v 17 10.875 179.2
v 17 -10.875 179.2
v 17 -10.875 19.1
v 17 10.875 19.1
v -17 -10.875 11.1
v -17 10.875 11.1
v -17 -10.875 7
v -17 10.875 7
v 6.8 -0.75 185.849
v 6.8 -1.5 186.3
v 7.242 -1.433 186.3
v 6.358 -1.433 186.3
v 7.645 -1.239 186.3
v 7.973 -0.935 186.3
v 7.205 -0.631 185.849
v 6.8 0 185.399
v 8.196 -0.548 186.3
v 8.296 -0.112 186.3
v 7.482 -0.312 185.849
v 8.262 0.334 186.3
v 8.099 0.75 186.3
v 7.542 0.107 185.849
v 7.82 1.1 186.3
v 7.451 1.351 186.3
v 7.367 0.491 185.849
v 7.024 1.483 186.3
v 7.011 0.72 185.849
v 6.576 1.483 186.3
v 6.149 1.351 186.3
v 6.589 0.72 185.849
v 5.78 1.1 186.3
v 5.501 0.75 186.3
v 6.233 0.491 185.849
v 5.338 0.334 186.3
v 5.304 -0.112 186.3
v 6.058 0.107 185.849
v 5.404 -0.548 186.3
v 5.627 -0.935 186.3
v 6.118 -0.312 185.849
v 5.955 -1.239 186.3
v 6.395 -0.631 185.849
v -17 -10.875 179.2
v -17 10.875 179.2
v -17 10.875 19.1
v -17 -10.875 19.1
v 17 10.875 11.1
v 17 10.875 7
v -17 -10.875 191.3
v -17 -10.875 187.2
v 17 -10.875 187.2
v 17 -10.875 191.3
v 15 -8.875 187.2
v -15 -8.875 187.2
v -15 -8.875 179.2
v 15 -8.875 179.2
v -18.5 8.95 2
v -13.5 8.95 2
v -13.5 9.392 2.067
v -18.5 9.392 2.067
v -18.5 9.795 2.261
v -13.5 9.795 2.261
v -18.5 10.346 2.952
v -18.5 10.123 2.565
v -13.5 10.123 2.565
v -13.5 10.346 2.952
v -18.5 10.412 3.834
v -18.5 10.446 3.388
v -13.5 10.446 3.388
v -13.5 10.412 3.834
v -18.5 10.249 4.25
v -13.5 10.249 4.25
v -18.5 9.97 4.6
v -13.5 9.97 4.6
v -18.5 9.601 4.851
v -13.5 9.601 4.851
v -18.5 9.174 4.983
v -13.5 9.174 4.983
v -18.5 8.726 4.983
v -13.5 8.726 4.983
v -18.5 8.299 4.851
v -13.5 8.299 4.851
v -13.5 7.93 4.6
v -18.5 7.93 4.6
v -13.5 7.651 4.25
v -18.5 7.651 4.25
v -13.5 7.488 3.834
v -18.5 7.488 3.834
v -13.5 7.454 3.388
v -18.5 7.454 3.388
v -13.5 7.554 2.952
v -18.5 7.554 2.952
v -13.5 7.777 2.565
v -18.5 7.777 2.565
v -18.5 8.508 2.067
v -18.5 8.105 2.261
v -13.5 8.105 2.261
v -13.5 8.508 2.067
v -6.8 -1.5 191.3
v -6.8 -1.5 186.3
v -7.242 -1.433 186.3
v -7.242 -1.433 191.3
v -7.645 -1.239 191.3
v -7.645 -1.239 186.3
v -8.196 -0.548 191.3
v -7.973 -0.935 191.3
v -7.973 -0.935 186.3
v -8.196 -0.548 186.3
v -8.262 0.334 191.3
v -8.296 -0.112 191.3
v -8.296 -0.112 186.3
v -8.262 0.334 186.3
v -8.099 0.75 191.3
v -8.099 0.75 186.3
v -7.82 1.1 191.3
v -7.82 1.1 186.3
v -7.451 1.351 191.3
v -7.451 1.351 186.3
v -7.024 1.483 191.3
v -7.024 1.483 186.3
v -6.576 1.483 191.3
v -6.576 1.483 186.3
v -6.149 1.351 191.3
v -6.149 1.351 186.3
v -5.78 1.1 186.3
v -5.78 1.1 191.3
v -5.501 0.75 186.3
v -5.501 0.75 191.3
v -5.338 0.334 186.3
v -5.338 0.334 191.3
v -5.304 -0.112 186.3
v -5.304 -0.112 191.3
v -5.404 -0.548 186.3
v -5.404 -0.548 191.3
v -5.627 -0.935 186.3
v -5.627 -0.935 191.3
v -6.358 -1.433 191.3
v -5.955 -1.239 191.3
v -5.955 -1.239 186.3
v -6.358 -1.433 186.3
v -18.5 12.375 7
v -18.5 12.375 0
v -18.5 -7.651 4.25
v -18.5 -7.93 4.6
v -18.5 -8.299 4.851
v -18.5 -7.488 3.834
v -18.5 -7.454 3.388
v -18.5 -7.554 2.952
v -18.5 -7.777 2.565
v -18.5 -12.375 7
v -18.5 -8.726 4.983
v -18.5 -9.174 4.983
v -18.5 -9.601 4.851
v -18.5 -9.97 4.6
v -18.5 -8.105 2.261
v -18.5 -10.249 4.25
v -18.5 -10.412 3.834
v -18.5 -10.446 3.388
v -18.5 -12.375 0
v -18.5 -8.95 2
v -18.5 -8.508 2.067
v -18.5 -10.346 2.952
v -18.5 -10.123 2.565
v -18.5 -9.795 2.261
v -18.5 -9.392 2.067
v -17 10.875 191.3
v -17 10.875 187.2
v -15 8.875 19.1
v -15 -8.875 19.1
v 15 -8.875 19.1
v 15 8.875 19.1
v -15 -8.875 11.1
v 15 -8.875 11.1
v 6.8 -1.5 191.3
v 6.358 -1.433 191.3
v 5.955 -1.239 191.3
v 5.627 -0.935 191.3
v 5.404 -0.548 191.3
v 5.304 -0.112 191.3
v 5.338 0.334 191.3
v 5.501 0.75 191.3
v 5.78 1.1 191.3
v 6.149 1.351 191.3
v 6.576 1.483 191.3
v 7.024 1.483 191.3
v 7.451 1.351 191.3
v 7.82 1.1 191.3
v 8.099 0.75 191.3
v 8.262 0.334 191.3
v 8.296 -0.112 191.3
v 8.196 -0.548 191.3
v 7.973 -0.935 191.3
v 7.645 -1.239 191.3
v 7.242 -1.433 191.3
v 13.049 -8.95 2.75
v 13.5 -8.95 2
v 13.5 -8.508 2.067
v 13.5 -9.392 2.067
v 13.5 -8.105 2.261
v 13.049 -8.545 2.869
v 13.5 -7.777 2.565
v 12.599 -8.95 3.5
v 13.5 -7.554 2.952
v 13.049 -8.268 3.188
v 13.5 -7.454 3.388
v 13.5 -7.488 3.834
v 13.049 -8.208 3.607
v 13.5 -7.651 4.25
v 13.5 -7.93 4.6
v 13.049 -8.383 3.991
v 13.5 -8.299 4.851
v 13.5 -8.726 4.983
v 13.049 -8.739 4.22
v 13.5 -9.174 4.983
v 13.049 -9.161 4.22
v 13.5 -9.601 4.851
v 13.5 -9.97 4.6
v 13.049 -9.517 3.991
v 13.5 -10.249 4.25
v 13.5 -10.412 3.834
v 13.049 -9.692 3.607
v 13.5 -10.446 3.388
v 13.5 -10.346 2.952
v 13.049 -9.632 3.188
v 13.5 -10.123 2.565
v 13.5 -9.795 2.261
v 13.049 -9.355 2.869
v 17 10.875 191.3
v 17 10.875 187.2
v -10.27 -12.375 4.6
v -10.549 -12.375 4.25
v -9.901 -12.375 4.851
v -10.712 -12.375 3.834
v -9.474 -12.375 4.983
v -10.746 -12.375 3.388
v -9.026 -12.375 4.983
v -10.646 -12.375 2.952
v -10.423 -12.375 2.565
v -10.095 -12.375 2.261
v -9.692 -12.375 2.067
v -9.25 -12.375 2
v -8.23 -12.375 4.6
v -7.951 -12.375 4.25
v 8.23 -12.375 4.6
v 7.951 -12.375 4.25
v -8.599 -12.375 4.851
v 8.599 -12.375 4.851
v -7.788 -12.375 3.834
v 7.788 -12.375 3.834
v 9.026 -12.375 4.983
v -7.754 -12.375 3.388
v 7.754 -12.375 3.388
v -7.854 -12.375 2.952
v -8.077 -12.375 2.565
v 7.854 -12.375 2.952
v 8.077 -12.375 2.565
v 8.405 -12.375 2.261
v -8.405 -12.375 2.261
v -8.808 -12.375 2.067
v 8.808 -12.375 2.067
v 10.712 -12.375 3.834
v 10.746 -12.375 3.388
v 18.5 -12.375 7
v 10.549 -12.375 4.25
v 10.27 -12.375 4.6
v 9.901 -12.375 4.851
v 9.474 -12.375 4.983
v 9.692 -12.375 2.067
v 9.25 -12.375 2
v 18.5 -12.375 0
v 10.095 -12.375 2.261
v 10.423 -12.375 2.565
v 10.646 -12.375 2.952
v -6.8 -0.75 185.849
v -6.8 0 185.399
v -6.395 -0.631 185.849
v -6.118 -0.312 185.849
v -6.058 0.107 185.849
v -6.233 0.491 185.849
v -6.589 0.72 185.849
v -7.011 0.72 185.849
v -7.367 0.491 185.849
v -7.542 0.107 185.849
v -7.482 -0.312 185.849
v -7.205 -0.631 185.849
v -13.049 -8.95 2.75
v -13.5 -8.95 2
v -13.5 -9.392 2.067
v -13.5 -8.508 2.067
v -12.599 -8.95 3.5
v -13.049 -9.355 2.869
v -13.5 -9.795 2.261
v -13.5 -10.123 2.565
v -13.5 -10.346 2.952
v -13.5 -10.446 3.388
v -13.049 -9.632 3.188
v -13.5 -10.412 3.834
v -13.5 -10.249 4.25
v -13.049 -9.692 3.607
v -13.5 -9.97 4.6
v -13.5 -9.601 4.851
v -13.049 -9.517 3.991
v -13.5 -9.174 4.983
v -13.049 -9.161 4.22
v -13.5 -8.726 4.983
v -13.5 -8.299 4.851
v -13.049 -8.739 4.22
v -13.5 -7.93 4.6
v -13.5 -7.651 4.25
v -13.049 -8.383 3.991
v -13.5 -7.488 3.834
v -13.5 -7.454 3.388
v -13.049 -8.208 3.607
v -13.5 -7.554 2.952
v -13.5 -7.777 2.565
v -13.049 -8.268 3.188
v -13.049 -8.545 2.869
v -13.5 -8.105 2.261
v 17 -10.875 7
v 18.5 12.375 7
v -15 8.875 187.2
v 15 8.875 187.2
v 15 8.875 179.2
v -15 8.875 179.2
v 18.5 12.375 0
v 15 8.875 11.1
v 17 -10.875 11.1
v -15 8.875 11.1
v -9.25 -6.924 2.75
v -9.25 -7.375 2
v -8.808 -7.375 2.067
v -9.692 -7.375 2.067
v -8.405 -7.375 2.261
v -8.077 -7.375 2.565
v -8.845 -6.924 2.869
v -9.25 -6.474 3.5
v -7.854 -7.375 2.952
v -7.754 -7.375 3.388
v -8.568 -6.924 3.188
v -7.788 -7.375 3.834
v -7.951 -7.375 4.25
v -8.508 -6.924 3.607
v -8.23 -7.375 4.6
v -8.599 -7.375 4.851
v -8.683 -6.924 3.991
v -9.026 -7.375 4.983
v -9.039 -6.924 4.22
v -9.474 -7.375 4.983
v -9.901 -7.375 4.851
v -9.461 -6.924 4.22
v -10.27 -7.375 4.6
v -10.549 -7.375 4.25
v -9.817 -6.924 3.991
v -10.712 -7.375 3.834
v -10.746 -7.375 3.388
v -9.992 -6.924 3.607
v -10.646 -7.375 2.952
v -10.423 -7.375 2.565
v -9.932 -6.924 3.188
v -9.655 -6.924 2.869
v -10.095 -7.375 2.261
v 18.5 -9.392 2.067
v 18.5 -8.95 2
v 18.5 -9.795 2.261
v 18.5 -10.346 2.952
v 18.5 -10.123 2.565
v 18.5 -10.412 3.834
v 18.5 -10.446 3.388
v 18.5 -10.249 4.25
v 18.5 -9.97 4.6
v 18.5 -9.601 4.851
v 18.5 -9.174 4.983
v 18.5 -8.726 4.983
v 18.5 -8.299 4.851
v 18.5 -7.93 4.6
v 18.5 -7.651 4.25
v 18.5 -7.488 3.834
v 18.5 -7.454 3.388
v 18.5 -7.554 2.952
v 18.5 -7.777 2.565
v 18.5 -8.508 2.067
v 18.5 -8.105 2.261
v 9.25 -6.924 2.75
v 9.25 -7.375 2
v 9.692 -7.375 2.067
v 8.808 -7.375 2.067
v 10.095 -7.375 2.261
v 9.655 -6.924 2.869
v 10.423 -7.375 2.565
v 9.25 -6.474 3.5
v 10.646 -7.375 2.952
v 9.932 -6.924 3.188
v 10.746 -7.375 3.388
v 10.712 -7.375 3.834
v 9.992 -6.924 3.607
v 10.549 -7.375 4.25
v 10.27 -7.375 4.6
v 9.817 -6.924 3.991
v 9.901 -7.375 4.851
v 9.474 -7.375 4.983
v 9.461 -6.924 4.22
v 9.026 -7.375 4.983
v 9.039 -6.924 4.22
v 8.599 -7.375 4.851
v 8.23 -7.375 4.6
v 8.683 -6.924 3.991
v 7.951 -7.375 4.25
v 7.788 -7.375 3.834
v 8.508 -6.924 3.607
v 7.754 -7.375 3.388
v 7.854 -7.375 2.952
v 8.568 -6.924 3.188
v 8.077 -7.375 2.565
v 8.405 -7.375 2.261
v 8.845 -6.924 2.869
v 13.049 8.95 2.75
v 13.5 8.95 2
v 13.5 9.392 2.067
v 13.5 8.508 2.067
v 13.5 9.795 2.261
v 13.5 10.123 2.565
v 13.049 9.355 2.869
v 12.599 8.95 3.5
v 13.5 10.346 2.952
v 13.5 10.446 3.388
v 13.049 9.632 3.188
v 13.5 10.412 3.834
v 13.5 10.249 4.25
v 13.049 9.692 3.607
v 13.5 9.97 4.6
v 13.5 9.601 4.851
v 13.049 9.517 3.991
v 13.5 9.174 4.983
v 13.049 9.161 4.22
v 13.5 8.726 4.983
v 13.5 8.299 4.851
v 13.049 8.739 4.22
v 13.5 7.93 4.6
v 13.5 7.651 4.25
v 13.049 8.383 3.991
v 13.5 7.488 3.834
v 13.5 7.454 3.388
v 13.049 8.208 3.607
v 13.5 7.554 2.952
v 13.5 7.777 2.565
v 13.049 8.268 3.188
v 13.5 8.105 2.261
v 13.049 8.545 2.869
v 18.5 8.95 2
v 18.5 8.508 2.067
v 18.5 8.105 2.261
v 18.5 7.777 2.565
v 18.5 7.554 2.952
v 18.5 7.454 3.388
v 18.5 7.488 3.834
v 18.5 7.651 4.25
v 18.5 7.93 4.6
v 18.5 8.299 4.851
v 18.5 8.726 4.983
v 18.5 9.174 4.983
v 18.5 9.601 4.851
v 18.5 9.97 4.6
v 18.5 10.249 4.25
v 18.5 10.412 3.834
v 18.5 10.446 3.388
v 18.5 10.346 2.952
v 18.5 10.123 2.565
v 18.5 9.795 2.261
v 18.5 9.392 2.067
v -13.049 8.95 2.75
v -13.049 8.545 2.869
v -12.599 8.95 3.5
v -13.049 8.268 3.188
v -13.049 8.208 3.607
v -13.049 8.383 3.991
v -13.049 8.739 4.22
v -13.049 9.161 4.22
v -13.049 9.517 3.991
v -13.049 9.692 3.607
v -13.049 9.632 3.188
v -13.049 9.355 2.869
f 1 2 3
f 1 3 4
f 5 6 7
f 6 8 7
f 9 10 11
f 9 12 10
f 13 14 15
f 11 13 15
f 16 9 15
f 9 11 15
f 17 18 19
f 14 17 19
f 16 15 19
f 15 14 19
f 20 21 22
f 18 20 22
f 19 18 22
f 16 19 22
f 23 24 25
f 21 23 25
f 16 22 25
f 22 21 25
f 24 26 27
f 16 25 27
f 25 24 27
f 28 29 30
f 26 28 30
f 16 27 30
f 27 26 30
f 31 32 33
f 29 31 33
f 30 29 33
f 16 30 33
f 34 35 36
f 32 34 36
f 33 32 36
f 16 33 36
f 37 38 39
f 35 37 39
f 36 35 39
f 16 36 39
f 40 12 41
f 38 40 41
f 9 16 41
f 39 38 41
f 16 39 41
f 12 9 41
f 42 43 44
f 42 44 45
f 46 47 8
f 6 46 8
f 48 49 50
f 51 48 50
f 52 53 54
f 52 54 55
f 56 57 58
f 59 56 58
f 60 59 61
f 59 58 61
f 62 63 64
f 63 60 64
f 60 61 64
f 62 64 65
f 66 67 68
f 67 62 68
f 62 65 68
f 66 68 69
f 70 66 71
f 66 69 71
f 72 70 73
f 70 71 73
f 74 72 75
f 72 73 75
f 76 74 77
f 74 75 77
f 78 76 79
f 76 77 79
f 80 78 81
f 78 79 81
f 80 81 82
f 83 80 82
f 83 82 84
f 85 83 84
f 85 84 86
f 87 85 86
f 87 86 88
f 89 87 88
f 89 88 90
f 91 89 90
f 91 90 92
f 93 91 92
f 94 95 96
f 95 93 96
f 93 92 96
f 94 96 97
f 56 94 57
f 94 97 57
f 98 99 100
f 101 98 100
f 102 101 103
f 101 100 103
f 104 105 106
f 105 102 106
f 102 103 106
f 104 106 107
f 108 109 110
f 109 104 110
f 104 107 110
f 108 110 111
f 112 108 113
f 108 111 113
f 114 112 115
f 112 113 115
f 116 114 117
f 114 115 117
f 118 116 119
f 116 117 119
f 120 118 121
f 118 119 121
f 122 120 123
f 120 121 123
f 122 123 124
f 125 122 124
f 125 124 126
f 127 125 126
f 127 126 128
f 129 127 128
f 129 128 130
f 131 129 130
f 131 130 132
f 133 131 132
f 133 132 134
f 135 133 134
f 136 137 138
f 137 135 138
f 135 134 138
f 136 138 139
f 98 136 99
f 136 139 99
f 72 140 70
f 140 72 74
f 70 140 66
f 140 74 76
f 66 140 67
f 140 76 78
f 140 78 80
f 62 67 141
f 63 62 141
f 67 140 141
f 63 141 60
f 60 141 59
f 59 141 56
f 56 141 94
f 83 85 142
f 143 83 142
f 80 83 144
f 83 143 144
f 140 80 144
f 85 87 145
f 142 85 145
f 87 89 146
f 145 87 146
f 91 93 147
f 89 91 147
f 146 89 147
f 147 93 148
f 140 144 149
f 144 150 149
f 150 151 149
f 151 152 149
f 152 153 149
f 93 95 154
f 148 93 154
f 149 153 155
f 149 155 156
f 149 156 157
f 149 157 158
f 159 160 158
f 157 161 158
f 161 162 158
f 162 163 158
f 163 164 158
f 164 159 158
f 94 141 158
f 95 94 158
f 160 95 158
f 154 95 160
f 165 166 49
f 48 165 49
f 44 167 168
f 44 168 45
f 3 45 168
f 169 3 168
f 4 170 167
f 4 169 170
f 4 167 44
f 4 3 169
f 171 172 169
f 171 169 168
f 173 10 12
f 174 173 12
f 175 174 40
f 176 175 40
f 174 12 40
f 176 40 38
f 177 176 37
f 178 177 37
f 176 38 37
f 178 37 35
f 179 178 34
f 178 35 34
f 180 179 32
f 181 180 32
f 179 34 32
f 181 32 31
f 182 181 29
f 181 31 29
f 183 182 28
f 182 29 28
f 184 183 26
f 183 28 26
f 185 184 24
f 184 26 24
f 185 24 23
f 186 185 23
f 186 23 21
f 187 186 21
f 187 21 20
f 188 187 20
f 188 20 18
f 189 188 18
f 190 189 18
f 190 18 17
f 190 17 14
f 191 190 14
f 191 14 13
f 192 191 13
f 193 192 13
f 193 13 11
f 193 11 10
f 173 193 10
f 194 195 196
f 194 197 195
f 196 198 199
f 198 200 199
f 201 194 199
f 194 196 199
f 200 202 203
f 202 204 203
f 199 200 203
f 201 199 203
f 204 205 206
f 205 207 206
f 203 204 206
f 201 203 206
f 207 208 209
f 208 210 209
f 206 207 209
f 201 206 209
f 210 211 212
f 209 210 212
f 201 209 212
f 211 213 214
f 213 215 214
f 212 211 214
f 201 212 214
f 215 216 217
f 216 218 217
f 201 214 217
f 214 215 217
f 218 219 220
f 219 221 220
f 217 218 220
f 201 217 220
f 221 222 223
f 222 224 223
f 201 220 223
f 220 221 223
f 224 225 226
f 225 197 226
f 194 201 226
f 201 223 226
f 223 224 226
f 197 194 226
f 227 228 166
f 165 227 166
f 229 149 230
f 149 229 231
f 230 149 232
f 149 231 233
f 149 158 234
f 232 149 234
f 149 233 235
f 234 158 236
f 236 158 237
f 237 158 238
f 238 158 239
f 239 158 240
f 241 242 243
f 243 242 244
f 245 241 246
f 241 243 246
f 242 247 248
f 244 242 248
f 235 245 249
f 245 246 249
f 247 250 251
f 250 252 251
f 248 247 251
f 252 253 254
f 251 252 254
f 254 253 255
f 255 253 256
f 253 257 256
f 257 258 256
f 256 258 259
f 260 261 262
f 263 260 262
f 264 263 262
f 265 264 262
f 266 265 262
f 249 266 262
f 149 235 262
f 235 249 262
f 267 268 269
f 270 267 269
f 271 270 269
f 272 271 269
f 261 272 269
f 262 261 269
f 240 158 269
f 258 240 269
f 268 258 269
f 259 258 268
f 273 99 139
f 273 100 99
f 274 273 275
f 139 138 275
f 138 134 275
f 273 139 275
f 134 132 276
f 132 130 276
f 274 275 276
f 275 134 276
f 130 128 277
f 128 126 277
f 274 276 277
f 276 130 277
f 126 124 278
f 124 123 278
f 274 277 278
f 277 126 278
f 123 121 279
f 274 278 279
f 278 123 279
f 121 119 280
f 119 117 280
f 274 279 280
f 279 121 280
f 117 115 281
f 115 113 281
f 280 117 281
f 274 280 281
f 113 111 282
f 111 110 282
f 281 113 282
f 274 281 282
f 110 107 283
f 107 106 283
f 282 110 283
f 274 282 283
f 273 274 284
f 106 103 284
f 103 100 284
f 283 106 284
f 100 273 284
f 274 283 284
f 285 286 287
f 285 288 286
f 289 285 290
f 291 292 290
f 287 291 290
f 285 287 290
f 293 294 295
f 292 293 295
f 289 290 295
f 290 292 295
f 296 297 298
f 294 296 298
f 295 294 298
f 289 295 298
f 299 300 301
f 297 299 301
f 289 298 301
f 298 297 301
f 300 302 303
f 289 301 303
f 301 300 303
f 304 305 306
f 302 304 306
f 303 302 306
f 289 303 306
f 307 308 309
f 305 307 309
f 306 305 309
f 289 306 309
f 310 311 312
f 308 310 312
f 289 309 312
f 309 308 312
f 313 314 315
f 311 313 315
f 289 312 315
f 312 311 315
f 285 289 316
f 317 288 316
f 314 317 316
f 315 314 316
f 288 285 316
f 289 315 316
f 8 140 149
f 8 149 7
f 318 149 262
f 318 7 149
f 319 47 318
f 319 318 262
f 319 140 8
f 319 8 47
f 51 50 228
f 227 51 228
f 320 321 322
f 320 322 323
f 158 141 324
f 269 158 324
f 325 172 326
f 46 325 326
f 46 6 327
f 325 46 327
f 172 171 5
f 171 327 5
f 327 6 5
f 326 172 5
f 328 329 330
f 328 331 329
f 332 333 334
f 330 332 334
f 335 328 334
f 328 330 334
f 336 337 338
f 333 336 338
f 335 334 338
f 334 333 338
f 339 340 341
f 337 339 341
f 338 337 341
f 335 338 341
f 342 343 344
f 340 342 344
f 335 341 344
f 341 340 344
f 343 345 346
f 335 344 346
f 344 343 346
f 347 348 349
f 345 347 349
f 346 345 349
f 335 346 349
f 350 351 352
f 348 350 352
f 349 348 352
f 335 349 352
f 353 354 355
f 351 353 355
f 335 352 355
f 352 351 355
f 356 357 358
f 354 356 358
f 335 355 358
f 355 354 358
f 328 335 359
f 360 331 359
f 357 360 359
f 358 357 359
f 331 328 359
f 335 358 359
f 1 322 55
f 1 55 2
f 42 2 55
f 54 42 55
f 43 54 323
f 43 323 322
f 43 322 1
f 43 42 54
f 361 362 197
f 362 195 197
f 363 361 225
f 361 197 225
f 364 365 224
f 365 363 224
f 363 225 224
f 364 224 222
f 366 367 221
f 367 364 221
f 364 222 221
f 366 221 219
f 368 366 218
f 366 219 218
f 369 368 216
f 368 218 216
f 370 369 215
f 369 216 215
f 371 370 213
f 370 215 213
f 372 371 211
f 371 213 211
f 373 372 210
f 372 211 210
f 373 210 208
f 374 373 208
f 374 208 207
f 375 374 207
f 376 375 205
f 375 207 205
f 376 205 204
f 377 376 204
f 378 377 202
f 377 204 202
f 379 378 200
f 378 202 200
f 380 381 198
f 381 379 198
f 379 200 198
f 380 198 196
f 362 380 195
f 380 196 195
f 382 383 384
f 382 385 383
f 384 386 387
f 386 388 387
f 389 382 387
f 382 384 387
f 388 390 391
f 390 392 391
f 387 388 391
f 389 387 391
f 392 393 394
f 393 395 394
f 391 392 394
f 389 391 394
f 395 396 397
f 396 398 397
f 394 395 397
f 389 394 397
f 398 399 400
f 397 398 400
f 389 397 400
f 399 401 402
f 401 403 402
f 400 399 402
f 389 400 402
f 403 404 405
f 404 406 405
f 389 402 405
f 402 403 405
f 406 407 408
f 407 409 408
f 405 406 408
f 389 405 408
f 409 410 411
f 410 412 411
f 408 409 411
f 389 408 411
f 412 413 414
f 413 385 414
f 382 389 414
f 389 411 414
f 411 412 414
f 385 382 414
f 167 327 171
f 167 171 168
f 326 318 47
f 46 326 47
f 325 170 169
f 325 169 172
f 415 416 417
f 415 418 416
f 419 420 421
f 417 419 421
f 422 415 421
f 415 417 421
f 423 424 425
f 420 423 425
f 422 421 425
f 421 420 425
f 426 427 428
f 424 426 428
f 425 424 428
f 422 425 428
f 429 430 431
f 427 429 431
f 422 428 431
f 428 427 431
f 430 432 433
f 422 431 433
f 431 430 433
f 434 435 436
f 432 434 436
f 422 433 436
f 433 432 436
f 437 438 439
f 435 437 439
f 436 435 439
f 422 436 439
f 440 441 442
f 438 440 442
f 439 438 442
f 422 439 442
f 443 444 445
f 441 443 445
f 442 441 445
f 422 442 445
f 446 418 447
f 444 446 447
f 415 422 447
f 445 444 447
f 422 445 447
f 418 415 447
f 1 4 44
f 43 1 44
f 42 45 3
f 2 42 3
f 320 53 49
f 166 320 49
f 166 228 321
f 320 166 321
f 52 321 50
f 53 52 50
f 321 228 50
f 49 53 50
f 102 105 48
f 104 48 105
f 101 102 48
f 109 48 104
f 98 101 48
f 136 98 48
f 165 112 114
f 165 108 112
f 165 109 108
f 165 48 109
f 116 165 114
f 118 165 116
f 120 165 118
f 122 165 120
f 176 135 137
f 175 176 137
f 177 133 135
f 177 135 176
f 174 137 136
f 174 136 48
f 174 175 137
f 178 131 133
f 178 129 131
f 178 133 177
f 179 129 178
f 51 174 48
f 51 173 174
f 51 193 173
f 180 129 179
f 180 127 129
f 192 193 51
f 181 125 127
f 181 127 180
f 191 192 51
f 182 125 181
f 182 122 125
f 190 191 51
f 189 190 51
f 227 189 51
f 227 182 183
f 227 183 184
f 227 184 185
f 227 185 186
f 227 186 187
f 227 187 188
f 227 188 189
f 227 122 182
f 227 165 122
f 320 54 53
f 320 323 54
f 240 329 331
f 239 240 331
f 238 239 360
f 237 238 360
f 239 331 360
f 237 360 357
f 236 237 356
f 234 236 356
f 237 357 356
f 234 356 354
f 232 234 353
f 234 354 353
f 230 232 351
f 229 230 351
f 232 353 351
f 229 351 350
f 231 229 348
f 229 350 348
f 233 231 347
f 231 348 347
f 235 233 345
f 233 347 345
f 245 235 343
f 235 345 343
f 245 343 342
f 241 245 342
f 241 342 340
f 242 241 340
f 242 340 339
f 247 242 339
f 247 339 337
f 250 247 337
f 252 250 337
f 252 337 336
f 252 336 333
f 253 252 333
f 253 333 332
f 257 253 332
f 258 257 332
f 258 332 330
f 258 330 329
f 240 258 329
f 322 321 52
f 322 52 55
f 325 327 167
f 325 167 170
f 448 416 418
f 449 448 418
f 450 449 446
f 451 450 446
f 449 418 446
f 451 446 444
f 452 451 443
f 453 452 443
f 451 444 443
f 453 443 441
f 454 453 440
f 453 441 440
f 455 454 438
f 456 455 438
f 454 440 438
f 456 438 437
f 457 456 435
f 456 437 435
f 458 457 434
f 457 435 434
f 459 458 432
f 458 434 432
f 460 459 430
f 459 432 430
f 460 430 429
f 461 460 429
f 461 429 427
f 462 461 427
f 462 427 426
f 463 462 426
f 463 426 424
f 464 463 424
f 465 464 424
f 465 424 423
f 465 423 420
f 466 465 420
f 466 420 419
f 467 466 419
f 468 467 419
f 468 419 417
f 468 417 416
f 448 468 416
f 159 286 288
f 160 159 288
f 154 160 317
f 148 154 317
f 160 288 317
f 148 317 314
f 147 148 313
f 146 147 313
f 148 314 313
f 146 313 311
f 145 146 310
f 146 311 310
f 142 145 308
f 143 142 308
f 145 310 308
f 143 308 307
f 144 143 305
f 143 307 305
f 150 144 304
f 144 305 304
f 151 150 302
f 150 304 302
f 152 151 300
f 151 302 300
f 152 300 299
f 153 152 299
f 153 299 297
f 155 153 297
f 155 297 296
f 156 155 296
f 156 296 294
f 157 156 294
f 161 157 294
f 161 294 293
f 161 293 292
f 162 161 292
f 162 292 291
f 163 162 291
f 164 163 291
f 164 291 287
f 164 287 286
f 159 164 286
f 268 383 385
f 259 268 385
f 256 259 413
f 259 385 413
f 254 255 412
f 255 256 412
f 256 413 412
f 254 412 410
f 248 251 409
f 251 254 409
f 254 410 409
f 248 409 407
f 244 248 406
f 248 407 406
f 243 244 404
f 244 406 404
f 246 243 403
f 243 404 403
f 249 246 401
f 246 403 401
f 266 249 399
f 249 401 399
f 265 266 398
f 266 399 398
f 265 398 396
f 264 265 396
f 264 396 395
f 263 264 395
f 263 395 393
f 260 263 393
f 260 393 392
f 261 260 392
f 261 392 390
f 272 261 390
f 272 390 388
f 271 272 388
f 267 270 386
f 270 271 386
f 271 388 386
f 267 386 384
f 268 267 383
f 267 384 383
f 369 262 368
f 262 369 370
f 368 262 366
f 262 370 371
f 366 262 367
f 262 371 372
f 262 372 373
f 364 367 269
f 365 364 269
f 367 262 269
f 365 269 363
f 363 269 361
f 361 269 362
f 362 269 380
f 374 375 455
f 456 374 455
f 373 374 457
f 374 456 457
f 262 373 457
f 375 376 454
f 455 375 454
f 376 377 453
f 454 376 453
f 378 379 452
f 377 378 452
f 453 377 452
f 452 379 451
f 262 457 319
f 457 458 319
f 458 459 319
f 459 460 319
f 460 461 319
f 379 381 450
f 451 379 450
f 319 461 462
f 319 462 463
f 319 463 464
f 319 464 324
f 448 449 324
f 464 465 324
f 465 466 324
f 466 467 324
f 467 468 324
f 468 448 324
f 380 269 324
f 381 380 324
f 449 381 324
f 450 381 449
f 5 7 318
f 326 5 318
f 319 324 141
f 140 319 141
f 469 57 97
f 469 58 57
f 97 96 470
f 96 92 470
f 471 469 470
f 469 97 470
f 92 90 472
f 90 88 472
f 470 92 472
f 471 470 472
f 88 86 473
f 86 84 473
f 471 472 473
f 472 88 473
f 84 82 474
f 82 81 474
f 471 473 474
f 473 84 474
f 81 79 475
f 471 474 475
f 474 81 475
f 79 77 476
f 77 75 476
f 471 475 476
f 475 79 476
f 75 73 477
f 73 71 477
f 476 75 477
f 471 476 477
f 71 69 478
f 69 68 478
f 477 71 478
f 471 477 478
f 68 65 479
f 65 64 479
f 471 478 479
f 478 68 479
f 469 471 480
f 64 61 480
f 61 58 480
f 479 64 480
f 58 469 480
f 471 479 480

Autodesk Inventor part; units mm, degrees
ref_plane "YZ Plane" through (0, 0, 0) normal (1, 0, 0) x (0, 1, 0)
ref_plane "XZ Plane" through (0, 0, 0) normal (0, 1, 0) x (-1, 0, 0)
ref_plane "XY Plane" through (0, 0, 0) normal (0, 0, 1) x (1, 0, 0)
sketch "Sketch8" plane through (0, 0, 0) normal (0, 0, 1) x (1, 0, 0)
  line L0 (-18.5, -12.375) -> (18.5, -12.375)
  line L1 (18.5, -12.375) -> (18.5, 12.375)
  line L2 (18.5, 12.375) -> (-18.5, 12.375)
  line L3 (-18.5, 12.375) -> (-18.5, -12.375)
  line L4 (-18.5, -12.375) -> (18.5, 12.375) construction
  line L5 (18.5, -12.375) -> (-18.5, 12.375) construction
  point P0 (0, 0)
  dimension "d43" = 37
  dimension "d44" = 24.75
extrude "Extrusion6" add sketch "Sketch8" along normal blind 7
sketch "Sketch9" plane through (0, 0, 7) normal (0, 0, 1) x (1, 0, 0)
  line L0 (-17, -10.875) -> (17, -10.875)
  line L1 (17, -10.875) -> (17, 10.875)
  line L2 (17, 10.875) -> (-17, 10.875)
  line L3 (-17, 10.875) -> (-17, -10.875)
  line L4 (-17, -10.875) -> (17, 10.875) construction
  line L5 (17, -10.875) -> (-17, 10.875) construction
  line L6 (18.5, 12.375) -> (-18.5, 12.375) projected
  line L7 (18.5, -12.375) -> (18.5, 12.375) projected
  point P0 (0, 0)
  dimension "d49" = 1.5
  dimension "d50" = 1.5
extrude "Extrusion7" add sketch "Sketch9" along normal blind 184.3
sketch "Sketch10" plane through (18.5, -12.375, 0) normal (1, 0, 0) x (0, 0, -1)
  circle A0 centre (-3.5, 21.325) radius 1.5
  line L0 (0, 0) -> (0, 24.75) projected
  line L1 (0, 24.75) -> (-7, 24.75) projected
  point P0 (0, 12.375)
  dimension "d53" = 3
  dimension "d56" = 3.425
  dimension "d57" = 3.5
hole "Hole1" at (18.5, 8.95, 3.5) direction (-1, 0, 0) diameter 3 depth 5 tip angle 118
mirror "Mirror1" about plane through (0, 0, 0) normal (0, 1, 0) of "Hole1"
mirror "Mirror2" about plane through (0, 0, 0) normal (1, 0, 0) of "Hole1", "Mirror1"
sketch "Sketch11" plane through (-18.5, -12.375, 0) normal (0, -1, 0) x (1, 0, 0)
  line L0 (18.5, 0) -> (18.5, 7)
  line L1 (37, 7) -> (0, 7) projected
  line L2 (18.5, 3.5) -> (0, 3.5)
  line L3 (0, 0) -> (0, 7) projected
  circle A0 centre (9.25, 3.5) radius 1.5
  dimension "d66" = 3
hole "Hole2" at (-9.25, -12.375, 3.5) direction (0, 1, 0) diameter 3 depth 5 tip angle 118
mirror "Mirror3" about plane through (0, 0, 0) normal (1, 0, 0) of "Hole2"
sketch "Sketch12" plane through (0, 0, 191.3) normal (0, 0, 1) x (1, 0, 0)
  circle A0 centre (6.8, 0) radius 1.5
  line L0 (17, -10.875) -> (17, 10.875) projected
  line L1 (17, 10.875) -> (-17, 10.875) projected
  point P0 (0, 0)
  dimension "d74" = 3
  dimension "d75" = 10.2
  dimension "d76" = 10.875
hole "Hole3" at (6.8, 0, 191.3) direction (0, 0, -1) diameter 3 depth 5 tip angle 118
mirror "Mirror4" about plane through (0, 0, 0) normal (1, 0, 0) of "Hole3"
sketch "Sketch13" plane through (-17, -10.875, 7) normal (-1, 0, 0) x (0, 0, 1)
  line L0 (0, 21.75) -> (4.1, 21.75)
  line L1 (0, 21.75) -> (184.3, 21.75) projected
  line L2 (4.1, 21.75) -> (4.1, 0)
  line L3 (0, 0) -> (184.3, 0) projected
  line L4 (4.1, 21.75) -> (12.1, 21.75)
  line L5 (0, 21.75) -> (184.3, 21.75) projected
  line L6 (12.1, 21.75) -> (12.1, 0)
  line L7 (12.1, 0) -> (4.1, 0)
  point P0 (-7, 10.875)
  dimension "d84" = 4.1
  dimension "d85" = 90
  dimension "d86" = 8
  dimension "d87" = 90
extrude "Extrusion8" cut sketch "Sketch13" against normal blind 2
mirror "Mirror5" about plane through (0, 0, 0) normal (1, 0, 0) of "Extrusion8"
sketch "Sketch14" plane through (-17, 10.875, 7) normal (0, 1, 0) x (1, 0, 0)
  line L0 (34, -4.1) -> (32, -4.1) projected
  line L1 (2, -4.1) -> (2, -12.1) projected
  line L2 (32, -4.1) -> (2, -4.1)
  line L3 (2, -4.1) -> (2, -12.1)
  line L4 (2, -12.1) -> (32, -12.1)
  line L5 (32, -12.1) -> (32, -4.1)
  point P0 (17, 7)
extrude "Extrusion9" cut sketch "Sketch14" against normal blind 2
mirror "Mirror6" about plane through (0, 0, 0) normal (0, 1, 0) of "Extrusion9"
ref_plane "Work Plane4" through (0, 0, 99.15) normal (0, 0, 1) x (1, 0, 0)
mirror "Mirror7" about plane through (0, 0, 99.15) normal (0, 0, 1) of "Extrusion9", "Extrusion8", "Mirror5", "Mirror6"
properties part number "Mold"
